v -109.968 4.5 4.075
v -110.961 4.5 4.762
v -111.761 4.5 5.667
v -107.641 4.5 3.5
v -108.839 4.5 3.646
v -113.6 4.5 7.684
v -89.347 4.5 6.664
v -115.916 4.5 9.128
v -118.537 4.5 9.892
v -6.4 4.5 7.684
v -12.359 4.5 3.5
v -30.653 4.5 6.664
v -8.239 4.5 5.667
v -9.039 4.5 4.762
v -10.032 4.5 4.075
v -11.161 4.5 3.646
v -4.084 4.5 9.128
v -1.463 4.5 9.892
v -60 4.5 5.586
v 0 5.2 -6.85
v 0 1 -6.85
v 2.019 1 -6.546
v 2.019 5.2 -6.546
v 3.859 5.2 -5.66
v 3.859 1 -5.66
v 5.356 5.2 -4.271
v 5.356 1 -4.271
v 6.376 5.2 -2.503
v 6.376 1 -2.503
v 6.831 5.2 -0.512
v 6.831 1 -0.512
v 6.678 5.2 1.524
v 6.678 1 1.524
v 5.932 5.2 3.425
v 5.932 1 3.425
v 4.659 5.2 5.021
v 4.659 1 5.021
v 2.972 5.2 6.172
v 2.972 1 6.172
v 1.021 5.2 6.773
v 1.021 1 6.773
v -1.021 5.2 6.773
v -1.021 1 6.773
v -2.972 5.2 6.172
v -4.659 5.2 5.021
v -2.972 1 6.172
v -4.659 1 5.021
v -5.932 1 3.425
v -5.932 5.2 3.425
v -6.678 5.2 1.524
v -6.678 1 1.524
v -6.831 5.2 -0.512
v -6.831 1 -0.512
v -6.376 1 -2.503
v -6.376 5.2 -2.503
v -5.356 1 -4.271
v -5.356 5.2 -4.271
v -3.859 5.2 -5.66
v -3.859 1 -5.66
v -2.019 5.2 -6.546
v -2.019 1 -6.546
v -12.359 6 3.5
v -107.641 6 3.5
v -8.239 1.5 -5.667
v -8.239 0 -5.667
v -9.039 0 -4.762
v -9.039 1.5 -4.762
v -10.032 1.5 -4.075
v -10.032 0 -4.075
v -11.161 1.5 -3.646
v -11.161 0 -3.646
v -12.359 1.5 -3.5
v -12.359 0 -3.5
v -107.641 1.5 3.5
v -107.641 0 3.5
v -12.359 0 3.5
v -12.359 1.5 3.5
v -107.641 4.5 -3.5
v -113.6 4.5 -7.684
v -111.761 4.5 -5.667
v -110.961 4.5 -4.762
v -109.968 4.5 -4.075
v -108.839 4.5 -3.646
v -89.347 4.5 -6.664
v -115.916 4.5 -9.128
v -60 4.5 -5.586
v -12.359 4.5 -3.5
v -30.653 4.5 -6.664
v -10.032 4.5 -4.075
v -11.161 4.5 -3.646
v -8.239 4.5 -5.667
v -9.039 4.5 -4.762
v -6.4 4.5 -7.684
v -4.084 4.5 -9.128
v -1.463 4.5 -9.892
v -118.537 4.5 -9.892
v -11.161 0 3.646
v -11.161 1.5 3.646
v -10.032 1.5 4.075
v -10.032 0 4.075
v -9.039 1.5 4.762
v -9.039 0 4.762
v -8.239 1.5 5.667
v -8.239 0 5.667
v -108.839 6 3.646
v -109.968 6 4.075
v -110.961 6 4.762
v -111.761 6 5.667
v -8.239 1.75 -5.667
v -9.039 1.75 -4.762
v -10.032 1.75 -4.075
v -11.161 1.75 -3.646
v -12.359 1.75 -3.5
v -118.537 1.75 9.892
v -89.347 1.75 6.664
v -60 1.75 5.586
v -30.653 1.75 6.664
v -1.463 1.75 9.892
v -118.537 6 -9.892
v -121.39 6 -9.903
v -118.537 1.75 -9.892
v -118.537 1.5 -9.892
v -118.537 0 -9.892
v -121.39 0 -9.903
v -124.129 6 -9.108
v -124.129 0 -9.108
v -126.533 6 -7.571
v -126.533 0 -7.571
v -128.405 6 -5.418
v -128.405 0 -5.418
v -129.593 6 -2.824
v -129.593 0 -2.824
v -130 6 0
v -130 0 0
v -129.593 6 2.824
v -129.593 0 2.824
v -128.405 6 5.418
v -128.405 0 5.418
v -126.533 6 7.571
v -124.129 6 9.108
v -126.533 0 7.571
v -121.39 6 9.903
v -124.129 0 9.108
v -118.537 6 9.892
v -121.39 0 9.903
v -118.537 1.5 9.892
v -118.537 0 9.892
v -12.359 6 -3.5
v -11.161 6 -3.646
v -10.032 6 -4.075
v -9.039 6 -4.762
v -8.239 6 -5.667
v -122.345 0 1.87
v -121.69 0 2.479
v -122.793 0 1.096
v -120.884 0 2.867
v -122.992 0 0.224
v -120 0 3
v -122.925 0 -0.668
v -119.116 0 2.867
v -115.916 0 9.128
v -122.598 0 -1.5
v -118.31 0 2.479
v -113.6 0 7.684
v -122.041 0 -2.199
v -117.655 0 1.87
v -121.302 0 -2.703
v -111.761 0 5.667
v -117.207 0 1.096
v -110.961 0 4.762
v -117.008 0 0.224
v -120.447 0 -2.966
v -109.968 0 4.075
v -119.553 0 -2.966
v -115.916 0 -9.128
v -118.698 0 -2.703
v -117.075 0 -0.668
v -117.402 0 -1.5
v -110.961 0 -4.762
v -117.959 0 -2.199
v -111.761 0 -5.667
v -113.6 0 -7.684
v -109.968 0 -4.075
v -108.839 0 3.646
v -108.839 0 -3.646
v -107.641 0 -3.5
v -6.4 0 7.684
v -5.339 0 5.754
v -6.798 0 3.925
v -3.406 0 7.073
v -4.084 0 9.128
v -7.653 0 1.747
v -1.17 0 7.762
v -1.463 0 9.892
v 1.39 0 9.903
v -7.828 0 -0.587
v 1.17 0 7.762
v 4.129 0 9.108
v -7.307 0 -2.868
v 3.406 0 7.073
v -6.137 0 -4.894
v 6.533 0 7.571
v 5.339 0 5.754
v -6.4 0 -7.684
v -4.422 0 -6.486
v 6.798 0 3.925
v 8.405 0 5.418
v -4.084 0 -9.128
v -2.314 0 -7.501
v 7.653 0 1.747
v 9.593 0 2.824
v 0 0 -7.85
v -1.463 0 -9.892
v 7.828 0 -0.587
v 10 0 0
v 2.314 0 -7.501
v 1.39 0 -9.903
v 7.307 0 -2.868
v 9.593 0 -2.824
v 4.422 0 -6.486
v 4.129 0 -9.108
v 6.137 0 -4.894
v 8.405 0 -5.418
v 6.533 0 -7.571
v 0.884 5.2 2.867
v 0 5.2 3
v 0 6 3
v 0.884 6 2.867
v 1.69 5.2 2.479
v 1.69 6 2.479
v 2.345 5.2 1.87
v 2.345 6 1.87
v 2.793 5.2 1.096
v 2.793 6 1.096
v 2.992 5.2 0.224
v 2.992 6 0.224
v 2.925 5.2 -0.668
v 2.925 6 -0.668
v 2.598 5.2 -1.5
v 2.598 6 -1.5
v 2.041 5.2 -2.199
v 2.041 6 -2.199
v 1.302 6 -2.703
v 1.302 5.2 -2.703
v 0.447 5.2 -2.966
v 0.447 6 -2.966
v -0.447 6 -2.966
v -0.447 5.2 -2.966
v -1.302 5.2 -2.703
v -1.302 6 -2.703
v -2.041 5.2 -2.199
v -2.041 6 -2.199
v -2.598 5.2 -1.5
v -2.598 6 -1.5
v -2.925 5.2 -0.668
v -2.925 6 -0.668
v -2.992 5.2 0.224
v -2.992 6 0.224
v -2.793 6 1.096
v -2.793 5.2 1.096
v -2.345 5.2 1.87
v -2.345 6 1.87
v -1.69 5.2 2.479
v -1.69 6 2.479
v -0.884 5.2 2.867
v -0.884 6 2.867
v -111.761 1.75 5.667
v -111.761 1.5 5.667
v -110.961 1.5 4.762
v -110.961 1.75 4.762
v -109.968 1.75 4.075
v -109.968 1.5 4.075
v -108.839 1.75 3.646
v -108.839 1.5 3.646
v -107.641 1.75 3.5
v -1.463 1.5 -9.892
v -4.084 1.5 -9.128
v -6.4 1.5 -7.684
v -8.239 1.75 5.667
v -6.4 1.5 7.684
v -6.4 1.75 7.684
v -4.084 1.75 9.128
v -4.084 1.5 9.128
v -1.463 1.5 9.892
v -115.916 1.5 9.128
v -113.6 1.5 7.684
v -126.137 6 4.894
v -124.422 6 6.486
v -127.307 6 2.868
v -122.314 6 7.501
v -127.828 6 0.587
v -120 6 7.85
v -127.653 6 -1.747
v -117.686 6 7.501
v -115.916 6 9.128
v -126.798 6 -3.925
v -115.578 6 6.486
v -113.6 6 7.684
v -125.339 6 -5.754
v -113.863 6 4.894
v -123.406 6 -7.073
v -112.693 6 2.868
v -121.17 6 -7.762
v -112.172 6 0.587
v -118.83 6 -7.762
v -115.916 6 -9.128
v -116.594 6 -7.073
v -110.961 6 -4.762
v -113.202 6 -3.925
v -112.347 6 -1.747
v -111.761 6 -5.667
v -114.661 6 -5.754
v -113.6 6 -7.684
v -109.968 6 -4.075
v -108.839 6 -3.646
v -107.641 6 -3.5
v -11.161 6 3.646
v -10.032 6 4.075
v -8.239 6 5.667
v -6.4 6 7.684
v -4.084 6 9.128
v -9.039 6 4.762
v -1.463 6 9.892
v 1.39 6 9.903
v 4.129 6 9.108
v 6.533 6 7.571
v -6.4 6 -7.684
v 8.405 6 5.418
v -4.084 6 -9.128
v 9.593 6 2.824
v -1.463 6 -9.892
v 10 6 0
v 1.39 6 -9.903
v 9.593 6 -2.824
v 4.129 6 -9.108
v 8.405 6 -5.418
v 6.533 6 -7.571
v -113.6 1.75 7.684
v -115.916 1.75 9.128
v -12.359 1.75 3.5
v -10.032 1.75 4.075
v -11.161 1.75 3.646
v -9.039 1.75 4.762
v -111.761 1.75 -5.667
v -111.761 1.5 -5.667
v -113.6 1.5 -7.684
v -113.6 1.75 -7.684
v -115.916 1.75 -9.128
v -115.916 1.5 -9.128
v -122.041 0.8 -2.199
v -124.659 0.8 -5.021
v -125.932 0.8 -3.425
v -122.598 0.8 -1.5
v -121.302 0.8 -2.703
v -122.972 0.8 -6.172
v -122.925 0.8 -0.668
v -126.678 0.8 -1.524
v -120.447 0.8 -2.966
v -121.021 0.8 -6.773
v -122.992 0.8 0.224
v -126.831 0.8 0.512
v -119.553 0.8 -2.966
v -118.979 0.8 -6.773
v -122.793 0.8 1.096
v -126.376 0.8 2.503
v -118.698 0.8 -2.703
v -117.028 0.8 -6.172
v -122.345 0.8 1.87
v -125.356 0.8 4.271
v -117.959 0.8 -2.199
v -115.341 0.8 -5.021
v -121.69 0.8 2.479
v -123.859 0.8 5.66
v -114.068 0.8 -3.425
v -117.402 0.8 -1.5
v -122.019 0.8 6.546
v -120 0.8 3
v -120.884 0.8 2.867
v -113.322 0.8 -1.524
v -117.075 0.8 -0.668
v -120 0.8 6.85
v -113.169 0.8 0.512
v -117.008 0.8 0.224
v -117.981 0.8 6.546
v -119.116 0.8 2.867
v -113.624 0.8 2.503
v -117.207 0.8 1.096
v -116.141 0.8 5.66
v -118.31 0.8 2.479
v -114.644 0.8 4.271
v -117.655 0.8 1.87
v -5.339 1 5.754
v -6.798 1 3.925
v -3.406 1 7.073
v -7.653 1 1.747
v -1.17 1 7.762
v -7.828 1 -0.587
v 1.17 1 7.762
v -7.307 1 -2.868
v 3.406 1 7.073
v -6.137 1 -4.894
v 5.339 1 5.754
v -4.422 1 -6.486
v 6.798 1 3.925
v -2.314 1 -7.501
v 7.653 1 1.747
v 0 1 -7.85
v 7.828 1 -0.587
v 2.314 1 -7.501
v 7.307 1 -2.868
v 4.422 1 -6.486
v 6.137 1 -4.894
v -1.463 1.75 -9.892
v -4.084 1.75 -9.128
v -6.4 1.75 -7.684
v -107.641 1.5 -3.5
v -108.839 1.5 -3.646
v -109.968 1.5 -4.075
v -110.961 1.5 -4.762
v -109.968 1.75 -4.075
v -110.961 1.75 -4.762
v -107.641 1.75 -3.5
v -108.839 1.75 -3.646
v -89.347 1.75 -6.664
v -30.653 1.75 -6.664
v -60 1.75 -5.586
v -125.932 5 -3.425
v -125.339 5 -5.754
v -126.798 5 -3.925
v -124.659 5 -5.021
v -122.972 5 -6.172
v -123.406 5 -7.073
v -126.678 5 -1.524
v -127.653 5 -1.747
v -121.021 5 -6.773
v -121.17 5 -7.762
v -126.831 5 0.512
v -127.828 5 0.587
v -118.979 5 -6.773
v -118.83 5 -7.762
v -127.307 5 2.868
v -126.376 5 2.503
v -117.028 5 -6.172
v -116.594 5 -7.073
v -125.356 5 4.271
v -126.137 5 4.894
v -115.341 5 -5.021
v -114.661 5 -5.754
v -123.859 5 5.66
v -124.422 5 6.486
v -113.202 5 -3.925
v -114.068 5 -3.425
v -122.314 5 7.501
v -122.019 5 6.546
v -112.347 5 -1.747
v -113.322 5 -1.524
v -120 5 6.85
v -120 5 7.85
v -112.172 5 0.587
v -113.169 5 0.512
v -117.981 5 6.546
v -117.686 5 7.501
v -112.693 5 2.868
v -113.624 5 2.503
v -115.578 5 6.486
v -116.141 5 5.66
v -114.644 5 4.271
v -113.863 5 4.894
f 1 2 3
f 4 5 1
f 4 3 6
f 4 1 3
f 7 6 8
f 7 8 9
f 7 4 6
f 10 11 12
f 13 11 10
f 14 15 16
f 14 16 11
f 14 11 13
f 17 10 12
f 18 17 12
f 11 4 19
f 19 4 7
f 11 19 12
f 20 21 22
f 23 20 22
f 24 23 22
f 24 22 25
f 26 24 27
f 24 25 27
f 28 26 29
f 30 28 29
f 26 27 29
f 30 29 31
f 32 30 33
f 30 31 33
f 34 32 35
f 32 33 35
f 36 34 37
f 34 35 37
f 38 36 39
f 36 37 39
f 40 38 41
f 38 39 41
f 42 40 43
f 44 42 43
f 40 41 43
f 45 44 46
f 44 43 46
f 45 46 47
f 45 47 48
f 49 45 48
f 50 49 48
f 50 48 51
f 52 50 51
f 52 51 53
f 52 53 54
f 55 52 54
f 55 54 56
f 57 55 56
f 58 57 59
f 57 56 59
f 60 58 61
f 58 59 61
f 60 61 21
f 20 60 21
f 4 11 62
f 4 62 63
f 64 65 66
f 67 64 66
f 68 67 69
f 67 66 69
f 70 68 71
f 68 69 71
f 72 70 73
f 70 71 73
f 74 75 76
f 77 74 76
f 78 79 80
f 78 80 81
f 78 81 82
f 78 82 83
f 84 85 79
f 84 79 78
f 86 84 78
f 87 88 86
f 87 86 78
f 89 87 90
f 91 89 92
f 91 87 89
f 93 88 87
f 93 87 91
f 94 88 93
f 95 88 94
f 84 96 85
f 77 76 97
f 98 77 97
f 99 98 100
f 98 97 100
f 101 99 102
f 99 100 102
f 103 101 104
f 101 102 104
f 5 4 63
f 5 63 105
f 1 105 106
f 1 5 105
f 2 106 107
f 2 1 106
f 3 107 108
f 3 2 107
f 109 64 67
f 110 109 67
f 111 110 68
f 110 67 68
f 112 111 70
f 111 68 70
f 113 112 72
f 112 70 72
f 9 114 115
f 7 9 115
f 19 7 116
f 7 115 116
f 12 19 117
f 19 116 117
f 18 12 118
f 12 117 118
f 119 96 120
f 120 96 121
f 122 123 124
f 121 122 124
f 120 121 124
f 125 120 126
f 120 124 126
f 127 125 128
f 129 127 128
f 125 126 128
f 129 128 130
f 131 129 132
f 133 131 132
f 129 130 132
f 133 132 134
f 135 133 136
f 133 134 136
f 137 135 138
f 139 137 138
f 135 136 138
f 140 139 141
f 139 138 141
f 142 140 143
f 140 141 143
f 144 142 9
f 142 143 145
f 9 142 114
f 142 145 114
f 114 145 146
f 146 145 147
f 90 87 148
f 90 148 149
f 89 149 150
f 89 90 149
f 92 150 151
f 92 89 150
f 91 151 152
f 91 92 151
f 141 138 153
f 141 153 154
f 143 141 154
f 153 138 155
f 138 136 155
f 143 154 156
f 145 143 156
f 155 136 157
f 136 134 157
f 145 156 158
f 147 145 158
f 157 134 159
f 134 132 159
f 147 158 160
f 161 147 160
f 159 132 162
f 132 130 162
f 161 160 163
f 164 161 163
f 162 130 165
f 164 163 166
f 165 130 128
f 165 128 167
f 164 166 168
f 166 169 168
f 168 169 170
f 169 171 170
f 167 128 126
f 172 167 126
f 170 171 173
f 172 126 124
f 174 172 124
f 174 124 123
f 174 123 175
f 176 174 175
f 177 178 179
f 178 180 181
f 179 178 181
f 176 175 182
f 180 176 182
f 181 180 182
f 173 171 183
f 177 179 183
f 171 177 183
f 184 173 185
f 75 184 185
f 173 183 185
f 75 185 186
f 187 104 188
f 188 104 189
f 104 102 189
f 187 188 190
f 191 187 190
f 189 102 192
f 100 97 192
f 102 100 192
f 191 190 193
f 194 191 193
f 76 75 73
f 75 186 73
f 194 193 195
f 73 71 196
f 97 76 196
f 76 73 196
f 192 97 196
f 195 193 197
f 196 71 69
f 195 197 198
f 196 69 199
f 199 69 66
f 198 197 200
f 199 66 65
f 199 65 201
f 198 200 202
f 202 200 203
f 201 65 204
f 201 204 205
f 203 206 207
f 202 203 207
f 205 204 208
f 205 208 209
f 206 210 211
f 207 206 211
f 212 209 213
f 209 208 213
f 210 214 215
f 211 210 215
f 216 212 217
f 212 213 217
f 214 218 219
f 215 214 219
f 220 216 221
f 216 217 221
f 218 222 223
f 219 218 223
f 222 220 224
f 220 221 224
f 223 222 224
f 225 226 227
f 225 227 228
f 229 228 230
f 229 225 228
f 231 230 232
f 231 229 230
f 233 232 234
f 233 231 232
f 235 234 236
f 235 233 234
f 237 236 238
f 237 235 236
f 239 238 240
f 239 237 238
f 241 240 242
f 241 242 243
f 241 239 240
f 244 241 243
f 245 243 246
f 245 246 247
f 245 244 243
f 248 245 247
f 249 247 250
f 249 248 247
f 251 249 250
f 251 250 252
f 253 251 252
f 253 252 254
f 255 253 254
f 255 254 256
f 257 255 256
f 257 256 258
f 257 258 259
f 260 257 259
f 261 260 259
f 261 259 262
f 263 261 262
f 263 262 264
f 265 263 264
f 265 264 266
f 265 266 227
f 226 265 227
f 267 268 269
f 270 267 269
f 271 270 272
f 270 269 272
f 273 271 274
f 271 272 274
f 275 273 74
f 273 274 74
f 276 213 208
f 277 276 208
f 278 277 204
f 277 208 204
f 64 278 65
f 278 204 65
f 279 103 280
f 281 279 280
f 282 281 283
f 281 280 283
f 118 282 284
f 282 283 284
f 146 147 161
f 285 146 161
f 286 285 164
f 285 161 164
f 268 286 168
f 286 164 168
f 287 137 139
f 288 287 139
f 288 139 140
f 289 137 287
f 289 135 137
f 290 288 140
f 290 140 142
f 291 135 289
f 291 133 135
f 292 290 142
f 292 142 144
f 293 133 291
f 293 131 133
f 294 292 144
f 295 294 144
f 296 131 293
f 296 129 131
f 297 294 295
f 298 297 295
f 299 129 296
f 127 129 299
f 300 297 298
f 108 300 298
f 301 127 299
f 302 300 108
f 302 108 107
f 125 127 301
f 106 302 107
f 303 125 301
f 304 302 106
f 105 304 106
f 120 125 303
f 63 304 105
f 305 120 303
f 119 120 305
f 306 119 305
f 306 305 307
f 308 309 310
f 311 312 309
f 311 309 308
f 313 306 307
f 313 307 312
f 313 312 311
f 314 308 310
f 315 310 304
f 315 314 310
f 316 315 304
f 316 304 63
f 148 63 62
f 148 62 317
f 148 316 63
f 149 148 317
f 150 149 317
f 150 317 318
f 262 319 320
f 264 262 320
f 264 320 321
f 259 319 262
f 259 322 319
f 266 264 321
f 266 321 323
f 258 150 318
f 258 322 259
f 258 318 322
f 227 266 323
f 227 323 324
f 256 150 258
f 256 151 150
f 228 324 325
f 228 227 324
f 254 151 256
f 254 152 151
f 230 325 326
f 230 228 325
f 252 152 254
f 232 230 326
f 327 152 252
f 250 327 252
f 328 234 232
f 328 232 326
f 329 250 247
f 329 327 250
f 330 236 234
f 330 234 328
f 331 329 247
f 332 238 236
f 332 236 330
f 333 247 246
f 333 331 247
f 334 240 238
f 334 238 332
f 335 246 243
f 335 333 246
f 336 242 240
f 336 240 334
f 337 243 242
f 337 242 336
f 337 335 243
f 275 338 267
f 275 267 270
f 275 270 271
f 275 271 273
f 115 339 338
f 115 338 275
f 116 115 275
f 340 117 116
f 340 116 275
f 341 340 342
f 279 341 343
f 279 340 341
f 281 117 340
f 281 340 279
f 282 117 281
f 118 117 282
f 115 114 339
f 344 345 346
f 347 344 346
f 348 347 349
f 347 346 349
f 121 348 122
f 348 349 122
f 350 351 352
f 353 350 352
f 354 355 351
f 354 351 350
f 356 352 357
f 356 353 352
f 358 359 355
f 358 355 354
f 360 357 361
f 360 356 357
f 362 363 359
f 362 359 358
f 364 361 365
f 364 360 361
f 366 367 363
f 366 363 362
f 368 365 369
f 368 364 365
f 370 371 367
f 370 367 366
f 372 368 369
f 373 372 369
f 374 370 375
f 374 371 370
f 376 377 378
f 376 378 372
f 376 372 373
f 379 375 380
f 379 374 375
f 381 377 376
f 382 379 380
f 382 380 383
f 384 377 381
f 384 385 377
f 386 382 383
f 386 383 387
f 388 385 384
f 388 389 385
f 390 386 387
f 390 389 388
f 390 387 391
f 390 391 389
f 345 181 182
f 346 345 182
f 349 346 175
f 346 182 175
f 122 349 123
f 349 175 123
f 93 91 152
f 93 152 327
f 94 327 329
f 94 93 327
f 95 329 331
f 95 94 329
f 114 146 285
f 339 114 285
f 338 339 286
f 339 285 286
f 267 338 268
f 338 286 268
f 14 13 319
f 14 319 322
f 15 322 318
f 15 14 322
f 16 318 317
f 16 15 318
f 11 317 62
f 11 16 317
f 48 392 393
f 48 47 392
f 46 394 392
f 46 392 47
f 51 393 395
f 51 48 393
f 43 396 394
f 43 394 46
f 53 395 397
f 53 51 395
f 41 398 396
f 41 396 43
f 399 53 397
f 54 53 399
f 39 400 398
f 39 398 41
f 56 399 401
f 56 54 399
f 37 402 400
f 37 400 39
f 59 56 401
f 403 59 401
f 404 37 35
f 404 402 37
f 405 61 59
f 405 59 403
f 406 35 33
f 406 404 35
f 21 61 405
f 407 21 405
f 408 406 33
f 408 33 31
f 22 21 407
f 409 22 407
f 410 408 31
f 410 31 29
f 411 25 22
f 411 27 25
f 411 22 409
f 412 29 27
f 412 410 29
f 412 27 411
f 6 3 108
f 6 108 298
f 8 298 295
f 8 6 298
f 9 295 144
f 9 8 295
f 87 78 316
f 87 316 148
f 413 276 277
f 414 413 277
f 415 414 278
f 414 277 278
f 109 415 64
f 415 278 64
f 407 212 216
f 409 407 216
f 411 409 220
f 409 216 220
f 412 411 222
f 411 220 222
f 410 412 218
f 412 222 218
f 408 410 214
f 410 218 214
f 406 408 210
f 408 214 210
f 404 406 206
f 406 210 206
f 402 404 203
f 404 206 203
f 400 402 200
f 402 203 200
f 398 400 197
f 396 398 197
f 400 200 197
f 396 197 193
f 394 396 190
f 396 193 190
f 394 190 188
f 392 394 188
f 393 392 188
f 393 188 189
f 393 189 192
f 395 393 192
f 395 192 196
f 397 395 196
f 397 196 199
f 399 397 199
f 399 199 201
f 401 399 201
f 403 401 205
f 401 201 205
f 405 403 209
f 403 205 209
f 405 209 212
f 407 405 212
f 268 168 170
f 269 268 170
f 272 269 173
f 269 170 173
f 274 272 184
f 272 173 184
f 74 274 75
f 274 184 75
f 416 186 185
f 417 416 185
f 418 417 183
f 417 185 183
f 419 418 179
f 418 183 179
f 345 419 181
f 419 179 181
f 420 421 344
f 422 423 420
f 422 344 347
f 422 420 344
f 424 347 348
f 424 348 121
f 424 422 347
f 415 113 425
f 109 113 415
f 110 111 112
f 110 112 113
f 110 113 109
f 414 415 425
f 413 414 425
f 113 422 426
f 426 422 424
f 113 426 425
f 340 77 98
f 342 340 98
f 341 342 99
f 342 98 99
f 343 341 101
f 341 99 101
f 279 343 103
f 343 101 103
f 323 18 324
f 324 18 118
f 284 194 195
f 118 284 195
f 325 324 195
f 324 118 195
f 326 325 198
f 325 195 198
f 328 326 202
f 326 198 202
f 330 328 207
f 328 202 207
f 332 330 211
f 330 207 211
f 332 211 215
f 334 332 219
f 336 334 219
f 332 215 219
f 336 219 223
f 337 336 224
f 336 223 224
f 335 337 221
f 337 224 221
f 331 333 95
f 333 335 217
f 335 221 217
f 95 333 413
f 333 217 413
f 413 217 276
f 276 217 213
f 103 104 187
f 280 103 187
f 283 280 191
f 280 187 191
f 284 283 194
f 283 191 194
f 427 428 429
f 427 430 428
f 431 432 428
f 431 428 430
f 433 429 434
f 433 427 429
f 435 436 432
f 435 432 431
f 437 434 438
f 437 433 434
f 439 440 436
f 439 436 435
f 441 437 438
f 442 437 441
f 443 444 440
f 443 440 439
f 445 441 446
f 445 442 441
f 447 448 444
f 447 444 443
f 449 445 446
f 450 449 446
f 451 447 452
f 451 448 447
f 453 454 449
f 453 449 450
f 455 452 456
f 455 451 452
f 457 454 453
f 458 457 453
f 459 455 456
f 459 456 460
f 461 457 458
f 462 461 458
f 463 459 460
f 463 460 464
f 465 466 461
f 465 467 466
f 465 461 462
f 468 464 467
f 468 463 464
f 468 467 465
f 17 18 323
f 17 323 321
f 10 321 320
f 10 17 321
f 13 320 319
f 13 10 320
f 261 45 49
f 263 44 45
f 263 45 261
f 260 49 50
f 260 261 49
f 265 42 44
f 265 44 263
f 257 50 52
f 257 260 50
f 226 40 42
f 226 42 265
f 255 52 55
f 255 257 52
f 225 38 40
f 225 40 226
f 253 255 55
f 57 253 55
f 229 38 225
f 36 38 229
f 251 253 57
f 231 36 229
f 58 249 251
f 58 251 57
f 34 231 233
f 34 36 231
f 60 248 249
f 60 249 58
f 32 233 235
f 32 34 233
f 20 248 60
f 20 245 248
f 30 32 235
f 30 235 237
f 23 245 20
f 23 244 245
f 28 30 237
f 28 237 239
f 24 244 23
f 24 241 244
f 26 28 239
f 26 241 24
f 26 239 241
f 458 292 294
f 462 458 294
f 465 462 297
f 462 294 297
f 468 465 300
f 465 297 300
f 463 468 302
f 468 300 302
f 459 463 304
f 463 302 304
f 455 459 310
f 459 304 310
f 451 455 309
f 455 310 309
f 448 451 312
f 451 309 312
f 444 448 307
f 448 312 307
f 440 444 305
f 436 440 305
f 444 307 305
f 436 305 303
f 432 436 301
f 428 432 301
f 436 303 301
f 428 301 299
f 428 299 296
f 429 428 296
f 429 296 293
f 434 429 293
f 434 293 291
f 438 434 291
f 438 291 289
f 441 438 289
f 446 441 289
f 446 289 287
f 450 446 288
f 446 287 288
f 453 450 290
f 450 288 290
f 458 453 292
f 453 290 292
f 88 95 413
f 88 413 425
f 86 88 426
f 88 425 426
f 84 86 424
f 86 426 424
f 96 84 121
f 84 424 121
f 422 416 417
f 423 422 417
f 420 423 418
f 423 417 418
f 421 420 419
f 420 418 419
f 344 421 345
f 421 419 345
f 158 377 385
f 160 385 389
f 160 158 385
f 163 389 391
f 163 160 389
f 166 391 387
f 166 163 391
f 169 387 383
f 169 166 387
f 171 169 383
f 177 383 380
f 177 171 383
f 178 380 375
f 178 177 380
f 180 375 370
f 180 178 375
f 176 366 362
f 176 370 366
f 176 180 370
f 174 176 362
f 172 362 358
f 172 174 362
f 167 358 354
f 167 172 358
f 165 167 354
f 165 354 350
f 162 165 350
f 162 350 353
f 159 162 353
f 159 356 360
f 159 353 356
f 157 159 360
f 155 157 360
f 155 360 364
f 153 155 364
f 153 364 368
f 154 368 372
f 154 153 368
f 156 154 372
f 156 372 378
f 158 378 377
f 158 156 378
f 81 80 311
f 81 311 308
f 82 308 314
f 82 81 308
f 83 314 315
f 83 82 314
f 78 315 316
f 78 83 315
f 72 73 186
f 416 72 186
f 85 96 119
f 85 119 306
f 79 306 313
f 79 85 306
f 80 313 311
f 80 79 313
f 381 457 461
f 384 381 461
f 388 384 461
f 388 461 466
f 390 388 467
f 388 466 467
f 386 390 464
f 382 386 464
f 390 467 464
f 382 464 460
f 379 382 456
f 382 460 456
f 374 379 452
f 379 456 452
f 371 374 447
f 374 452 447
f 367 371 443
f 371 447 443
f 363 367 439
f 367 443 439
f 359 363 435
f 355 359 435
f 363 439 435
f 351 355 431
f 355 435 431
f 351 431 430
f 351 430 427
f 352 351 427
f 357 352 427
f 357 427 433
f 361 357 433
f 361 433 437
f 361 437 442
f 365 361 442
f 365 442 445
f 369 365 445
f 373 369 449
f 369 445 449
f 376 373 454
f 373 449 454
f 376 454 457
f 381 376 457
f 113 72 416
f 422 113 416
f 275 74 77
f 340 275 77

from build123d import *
from build123d.topology import SkipClean

# Parameters (mm, degrees)
SKETCH1_R           = 10
SKETCH1_R_2         = 7.85
SKETCH1_R_3         = 3
BOSS_EXTRUDE3_DEPTH = 6
SKETCH2_R           = 7.85
CUT_EXTRUDE1_DEPTH  = 1
SKETCH3_R           = 6.85
CUT_EXTRUDE2_DEPTH  = 4.2
SKETCH5_R           = 7.85
SKETCH5_R_2         = 3
CUT_EXTRUDE3_DEPTH  = 1
SKETCH6_R           = 6.85
CUT_EXTRUDE4_DEPTH  = 4.2
CUT_EXTRUDE5_DEPTH  = 1.5
CUT_EXTRUDE6_START  = -1.5
CUT_EXTRUDE6_DEPTH  = 1.5
CUT_EXTRUDE9_DEPTH  = 1.75


with BuildPart() as part:
    # Sketch1 → Boss-Extrude3 (new body)
    # profile 1 of 5: a face of its own
    with BuildSketch(Plane(origin=(0, 0, 0), x_dir=(1, 0, 0), z_dir=(0, 1, 0))):
        with Locations((-120, 0)):
            Circle(SKETCH1_R)
        with Locations((-120, 0)):
            Circle(SKETCH1_R_2, mode=Mode.SUBTRACT)
    # profile 2 of 5: a face of its own
    with BuildSketch(Plane(origin=(0, 0, 0), x_dir=(1, 0, 0), z_dir=(0, 1, 0))):
        with Locations((-120, 0)):
            Circle(SKETCH1_R_2)
        with Locations(Location((-120, 0, 0), (0, 0, 270))):
            Circle(SKETCH1_R_3, mode=Mode.SUBTRACT)
    # profile 3 of 5: a face of its own
    with BuildSketch(Plane(origin=(0, 0, 0), x_dir=(1, 0, 0), z_dir=(0, 1, 0))):
        with BuildLine():
            ThreePointArc((-1.463415785, -9.892341191), (-10, 3.94e-07), (-1.463415006, 9.892341306))
            ThreePointArc((-1.463415006, 9.892341306), (-60.000000188, 5.585995813), (-118.536585366, 9.892341361))
            ThreePointArc((-118.536585366, 9.892341361), (-112.429196002, 6.533217188), (-110, 0))
            ThreePointArc((-110, 0), (-112.429196002, -6.533217188), (-118.536585366, -9.892341361))
            ThreePointArc((-118.536585366, -9.892341361), (-60.000000582, -5.585995813), (-1.463415785, -9.892341191))
        make_face()
    # profile 4 of 5: a face of its own
    with BuildSketch(Plane(origin=(0, 0, 0), x_dir=(1, 0, 0), z_dir=(0, 1, 0))):
        Circle(SKETCH1_R)
        Circle(SKETCH1_R_2, mode=Mode.SUBTRACT)
    # profile 5 of 5: a face of its own
    with BuildSketch(Plane(origin=(0, 0, 0), x_dir=(1, 0, 0), z_dir=(0, 1, 0))):
        Circle(SKETCH1_R_2)
        with Locations(Location((0, 0, 0), (0, 0, 270))):
            Circle(SKETCH1_R_3, mode=Mode.SUBTRACT)
    extrude(amount=BOSS_EXTRUDE3_DEPTH)

    # Sketch2 → Cut-Extrude1 (cut)
    with BuildSketch(Plane(origin=(0, 6, 0), x_dir=(1, 0, 0), z_dir=(0, 1, 0))):
        with Locations(Location((-120, 0, 0), (0, 0, 270))):
            Circle(SKETCH2_R)
    extrude(amount=-CUT_EXTRUDE1_DEPTH, mode=Mode.SUBTRACT)

    # Sketch3 → Cut-Extrude2 (cut)
    with BuildSketch(Plane(origin=(0, 5, 0), x_dir=(1, 0, 0), z_dir=(0, 1, 0))):
        with Locations(Location((-120, 0, 0), (0, 0, 270))):
            Circle(SKETCH3_R)
    extrude(amount=-CUT_EXTRUDE2_DEPTH, mode=Mode.SUBTRACT)

    # Sketch5 → Cut-Extrude3 (cut)
    with BuildSketch(Plane.XZ):
        with Locations(Location((0, 0, 0), (0, 0, 270))):
            Circle(SKETCH5_R)
        with Locations(Location((0, 0, 0), (0, 0, 270))):
            Circle(SKETCH5_R_2, mode=Mode.SUBTRACT)
    extrude(amount=-CUT_EXTRUDE3_DEPTH, mode=Mode.SUBTRACT)

    # Sketch6 → Cut-Extrude4 (cut)
    with BuildSketch(Plane.XZ.offset(-1)):
        with Locations(Location((0, 0, 0), (0, 0, 270))):
            Circle(SKETCH6_R)
    extrude(amount=-CUT_EXTRUDE4_DEPTH, mode=Mode.SUBTRACT)

    # Sketch7 → Cut-Extrude5 (cut)
    with BuildSketch(Plane.XZ):
        with BuildLine():
            ThreePointArc((-8.239471396, 5.666666667), (-5.29155752, 8.485247139), (-1.463414634, 9.892341361))
            ThreePointArc((-1.463414634, 9.892341361), (-60, 5.585995813), (-118.536585366, 9.892341361))
            ThreePointArc((-118.536585366, 9.892341361), (-114.70844248, 8.485247139), (-111.760528604, 5.666666667))
            ThreePointArc((-111.760528604, 5.666666667), (-109.968166246, 4.074693984), (-107.640792906, 3.5))
            Line((-107.640792906, 3.5), (-12.359207094, 3.5))
            ThreePointArc((-12.359207094, 3.5), (-10.031833754, 4.074693984), (-8.239471396, 5.666666667))
        make_face()
        with BuildLine():
            ThreePointArc((-118.536585366, -9.892341361), (-60, -5.585995813), (-1.463414634, -9.892341361))
            ThreePointArc((-1.463414634, -9.892341361), (-5.29155752, -8.485247139), (-8.239471396, -5.666666667))
            ThreePointArc((-8.239471396, -5.666666667), (-10.031833754, -4.074693984), (-12.359207094, -3.5))
            Line((-12.359207094, -3.5), (-107.640792906, -3.5))
            ThreePointArc((-107.640792906, -3.5), (-109.968166246, -4.074693984), (-111.760528604, -5.666666667))
            ThreePointArc((-111.760528604, -5.666666667), (-114.70844248, -8.485247139), (-118.536585366, -9.892341361))
        make_face()
    extrude(amount=-CUT_EXTRUDE5_DEPTH, mode=Mode.SUBTRACT)

    # Sketch8 → Cut-Extrude6 (cut)
    with SkipClean():  # the faces are left unmerged after this step: merging them gives an invalid solid
        with BuildSketch(Plane(origin=(0, 6, 0), x_dir=(1, 0, 0), z_dir=(0, 1, 0)).offset(CUT_EXTRUDE6_START)):
            with BuildLine():
                ThreePointArc((-1.463414634, 9.892341361), (-60, 5.585995813), (-118.536585366, 9.892341361))
                ThreePointArc((-118.536585366, 9.892341361), (-114.70844248, 8.485247139), (-111.760528604, 5.666666667))
                ThreePointArc((-111.760528604, 5.666666667), (-109.968166246, 4.074693984), (-107.640792906, 3.5))
                Line((-107.640792906, 3.5), (-12.359207094, 3.5))
                ThreePointArc((-12.359207094, 3.5), (-10.031833754, 4.074693984), (-8.239471396, 5.666666667))
                ThreePointArc((-8.239471396, 5.666666667), (-5.29155752, 8.485247139), (-1.463414634, 9.892341361))
            make_face()
            with BuildLine():
                Line((-12.359207094, -3.5), (-107.640792906, -3.5))
                ThreePointArc((-107.640792906, -3.5), (-109.968166246, -4.074693984), (-111.760528604, -5.666666667))
                ThreePointArc((-111.760528604, -5.666666667), (-114.70844248, -8.485247139), (-118.536585366, -9.892341361))
                ThreePointArc((-118.536585366, -9.892341361), (-60, -5.585995813), (-1.463414634, -9.892341361))
                ThreePointArc((-1.463414634, -9.892341361), (-5.29155752, -8.485247139), (-8.239471396, -5.666666667))
                ThreePointArc((-8.239471396, -5.666666667), (-10.031833754, -4.074693984), (-12.359207094, -3.5))
            make_face()
        extrude(amount=CUT_EXTRUDE6_DEPTH, mode=Mode.SUBTRACT)

    # Sketch10 → Cut-Extrude9 (cut)
    with BuildSketch(Plane.XZ):
        with BuildLine():
            ThreePointArc((-1.463414634, 9.892341361), (-60, 5.585995813), (-118.536585366, 9.892341361))
            ThreePointArc((-118.536585366, 9.892341361), (-114.70844248, 8.485247139), (-111.760528604, 5.666666667))
            ThreePointArc((-111.760528604, 5.666666667), (-109.968166246, 4.074693984), (-107.640792906, 3.5))
            Line((-107.640792906, 3.5), (-12.359207094, 3.5))
            ThreePointArc((-12.359207094, 3.5), (-10.031833754, 4.074693984), (-8.239471396, 5.666666667))
            ThreePointArc((-8.239471396, 5.666666667), (-5.29155752, 8.485247139), (-1.463414634, 9.892341361))
        make_face()
        with BuildLine():
            Line((-12.359207094, -3.5), (-107.640792906, -3.5))
            ThreePointArc((-107.640792906, -3.5), (-109.968166246, -4.074693984), (-111.760528604, -5.666666667))
            ThreePointArc((-111.760528604, -5.666666667), (-114.70844248, -8.485247139), (-118.536585366, -9.892341361))
            ThreePointArc((-118.536585366, -9.892341361), (-60, -5.585995813), (-1.463414634, -9.892341361))
            ThreePointArc((-1.463414634, -9.892341361), (-5.29155752, -8.485247139), (-8.239471396, -5.666666667))
            ThreePointArc((-8.239471396, -5.666666667), (-10.031833754, -4.074693984), (-12.359207094, -3.5))
        make_face()
    extrude(amount=-CUT_EXTRUDE9_DEPTH, mode=Mode.SUBTRACT)


solid = part.part
